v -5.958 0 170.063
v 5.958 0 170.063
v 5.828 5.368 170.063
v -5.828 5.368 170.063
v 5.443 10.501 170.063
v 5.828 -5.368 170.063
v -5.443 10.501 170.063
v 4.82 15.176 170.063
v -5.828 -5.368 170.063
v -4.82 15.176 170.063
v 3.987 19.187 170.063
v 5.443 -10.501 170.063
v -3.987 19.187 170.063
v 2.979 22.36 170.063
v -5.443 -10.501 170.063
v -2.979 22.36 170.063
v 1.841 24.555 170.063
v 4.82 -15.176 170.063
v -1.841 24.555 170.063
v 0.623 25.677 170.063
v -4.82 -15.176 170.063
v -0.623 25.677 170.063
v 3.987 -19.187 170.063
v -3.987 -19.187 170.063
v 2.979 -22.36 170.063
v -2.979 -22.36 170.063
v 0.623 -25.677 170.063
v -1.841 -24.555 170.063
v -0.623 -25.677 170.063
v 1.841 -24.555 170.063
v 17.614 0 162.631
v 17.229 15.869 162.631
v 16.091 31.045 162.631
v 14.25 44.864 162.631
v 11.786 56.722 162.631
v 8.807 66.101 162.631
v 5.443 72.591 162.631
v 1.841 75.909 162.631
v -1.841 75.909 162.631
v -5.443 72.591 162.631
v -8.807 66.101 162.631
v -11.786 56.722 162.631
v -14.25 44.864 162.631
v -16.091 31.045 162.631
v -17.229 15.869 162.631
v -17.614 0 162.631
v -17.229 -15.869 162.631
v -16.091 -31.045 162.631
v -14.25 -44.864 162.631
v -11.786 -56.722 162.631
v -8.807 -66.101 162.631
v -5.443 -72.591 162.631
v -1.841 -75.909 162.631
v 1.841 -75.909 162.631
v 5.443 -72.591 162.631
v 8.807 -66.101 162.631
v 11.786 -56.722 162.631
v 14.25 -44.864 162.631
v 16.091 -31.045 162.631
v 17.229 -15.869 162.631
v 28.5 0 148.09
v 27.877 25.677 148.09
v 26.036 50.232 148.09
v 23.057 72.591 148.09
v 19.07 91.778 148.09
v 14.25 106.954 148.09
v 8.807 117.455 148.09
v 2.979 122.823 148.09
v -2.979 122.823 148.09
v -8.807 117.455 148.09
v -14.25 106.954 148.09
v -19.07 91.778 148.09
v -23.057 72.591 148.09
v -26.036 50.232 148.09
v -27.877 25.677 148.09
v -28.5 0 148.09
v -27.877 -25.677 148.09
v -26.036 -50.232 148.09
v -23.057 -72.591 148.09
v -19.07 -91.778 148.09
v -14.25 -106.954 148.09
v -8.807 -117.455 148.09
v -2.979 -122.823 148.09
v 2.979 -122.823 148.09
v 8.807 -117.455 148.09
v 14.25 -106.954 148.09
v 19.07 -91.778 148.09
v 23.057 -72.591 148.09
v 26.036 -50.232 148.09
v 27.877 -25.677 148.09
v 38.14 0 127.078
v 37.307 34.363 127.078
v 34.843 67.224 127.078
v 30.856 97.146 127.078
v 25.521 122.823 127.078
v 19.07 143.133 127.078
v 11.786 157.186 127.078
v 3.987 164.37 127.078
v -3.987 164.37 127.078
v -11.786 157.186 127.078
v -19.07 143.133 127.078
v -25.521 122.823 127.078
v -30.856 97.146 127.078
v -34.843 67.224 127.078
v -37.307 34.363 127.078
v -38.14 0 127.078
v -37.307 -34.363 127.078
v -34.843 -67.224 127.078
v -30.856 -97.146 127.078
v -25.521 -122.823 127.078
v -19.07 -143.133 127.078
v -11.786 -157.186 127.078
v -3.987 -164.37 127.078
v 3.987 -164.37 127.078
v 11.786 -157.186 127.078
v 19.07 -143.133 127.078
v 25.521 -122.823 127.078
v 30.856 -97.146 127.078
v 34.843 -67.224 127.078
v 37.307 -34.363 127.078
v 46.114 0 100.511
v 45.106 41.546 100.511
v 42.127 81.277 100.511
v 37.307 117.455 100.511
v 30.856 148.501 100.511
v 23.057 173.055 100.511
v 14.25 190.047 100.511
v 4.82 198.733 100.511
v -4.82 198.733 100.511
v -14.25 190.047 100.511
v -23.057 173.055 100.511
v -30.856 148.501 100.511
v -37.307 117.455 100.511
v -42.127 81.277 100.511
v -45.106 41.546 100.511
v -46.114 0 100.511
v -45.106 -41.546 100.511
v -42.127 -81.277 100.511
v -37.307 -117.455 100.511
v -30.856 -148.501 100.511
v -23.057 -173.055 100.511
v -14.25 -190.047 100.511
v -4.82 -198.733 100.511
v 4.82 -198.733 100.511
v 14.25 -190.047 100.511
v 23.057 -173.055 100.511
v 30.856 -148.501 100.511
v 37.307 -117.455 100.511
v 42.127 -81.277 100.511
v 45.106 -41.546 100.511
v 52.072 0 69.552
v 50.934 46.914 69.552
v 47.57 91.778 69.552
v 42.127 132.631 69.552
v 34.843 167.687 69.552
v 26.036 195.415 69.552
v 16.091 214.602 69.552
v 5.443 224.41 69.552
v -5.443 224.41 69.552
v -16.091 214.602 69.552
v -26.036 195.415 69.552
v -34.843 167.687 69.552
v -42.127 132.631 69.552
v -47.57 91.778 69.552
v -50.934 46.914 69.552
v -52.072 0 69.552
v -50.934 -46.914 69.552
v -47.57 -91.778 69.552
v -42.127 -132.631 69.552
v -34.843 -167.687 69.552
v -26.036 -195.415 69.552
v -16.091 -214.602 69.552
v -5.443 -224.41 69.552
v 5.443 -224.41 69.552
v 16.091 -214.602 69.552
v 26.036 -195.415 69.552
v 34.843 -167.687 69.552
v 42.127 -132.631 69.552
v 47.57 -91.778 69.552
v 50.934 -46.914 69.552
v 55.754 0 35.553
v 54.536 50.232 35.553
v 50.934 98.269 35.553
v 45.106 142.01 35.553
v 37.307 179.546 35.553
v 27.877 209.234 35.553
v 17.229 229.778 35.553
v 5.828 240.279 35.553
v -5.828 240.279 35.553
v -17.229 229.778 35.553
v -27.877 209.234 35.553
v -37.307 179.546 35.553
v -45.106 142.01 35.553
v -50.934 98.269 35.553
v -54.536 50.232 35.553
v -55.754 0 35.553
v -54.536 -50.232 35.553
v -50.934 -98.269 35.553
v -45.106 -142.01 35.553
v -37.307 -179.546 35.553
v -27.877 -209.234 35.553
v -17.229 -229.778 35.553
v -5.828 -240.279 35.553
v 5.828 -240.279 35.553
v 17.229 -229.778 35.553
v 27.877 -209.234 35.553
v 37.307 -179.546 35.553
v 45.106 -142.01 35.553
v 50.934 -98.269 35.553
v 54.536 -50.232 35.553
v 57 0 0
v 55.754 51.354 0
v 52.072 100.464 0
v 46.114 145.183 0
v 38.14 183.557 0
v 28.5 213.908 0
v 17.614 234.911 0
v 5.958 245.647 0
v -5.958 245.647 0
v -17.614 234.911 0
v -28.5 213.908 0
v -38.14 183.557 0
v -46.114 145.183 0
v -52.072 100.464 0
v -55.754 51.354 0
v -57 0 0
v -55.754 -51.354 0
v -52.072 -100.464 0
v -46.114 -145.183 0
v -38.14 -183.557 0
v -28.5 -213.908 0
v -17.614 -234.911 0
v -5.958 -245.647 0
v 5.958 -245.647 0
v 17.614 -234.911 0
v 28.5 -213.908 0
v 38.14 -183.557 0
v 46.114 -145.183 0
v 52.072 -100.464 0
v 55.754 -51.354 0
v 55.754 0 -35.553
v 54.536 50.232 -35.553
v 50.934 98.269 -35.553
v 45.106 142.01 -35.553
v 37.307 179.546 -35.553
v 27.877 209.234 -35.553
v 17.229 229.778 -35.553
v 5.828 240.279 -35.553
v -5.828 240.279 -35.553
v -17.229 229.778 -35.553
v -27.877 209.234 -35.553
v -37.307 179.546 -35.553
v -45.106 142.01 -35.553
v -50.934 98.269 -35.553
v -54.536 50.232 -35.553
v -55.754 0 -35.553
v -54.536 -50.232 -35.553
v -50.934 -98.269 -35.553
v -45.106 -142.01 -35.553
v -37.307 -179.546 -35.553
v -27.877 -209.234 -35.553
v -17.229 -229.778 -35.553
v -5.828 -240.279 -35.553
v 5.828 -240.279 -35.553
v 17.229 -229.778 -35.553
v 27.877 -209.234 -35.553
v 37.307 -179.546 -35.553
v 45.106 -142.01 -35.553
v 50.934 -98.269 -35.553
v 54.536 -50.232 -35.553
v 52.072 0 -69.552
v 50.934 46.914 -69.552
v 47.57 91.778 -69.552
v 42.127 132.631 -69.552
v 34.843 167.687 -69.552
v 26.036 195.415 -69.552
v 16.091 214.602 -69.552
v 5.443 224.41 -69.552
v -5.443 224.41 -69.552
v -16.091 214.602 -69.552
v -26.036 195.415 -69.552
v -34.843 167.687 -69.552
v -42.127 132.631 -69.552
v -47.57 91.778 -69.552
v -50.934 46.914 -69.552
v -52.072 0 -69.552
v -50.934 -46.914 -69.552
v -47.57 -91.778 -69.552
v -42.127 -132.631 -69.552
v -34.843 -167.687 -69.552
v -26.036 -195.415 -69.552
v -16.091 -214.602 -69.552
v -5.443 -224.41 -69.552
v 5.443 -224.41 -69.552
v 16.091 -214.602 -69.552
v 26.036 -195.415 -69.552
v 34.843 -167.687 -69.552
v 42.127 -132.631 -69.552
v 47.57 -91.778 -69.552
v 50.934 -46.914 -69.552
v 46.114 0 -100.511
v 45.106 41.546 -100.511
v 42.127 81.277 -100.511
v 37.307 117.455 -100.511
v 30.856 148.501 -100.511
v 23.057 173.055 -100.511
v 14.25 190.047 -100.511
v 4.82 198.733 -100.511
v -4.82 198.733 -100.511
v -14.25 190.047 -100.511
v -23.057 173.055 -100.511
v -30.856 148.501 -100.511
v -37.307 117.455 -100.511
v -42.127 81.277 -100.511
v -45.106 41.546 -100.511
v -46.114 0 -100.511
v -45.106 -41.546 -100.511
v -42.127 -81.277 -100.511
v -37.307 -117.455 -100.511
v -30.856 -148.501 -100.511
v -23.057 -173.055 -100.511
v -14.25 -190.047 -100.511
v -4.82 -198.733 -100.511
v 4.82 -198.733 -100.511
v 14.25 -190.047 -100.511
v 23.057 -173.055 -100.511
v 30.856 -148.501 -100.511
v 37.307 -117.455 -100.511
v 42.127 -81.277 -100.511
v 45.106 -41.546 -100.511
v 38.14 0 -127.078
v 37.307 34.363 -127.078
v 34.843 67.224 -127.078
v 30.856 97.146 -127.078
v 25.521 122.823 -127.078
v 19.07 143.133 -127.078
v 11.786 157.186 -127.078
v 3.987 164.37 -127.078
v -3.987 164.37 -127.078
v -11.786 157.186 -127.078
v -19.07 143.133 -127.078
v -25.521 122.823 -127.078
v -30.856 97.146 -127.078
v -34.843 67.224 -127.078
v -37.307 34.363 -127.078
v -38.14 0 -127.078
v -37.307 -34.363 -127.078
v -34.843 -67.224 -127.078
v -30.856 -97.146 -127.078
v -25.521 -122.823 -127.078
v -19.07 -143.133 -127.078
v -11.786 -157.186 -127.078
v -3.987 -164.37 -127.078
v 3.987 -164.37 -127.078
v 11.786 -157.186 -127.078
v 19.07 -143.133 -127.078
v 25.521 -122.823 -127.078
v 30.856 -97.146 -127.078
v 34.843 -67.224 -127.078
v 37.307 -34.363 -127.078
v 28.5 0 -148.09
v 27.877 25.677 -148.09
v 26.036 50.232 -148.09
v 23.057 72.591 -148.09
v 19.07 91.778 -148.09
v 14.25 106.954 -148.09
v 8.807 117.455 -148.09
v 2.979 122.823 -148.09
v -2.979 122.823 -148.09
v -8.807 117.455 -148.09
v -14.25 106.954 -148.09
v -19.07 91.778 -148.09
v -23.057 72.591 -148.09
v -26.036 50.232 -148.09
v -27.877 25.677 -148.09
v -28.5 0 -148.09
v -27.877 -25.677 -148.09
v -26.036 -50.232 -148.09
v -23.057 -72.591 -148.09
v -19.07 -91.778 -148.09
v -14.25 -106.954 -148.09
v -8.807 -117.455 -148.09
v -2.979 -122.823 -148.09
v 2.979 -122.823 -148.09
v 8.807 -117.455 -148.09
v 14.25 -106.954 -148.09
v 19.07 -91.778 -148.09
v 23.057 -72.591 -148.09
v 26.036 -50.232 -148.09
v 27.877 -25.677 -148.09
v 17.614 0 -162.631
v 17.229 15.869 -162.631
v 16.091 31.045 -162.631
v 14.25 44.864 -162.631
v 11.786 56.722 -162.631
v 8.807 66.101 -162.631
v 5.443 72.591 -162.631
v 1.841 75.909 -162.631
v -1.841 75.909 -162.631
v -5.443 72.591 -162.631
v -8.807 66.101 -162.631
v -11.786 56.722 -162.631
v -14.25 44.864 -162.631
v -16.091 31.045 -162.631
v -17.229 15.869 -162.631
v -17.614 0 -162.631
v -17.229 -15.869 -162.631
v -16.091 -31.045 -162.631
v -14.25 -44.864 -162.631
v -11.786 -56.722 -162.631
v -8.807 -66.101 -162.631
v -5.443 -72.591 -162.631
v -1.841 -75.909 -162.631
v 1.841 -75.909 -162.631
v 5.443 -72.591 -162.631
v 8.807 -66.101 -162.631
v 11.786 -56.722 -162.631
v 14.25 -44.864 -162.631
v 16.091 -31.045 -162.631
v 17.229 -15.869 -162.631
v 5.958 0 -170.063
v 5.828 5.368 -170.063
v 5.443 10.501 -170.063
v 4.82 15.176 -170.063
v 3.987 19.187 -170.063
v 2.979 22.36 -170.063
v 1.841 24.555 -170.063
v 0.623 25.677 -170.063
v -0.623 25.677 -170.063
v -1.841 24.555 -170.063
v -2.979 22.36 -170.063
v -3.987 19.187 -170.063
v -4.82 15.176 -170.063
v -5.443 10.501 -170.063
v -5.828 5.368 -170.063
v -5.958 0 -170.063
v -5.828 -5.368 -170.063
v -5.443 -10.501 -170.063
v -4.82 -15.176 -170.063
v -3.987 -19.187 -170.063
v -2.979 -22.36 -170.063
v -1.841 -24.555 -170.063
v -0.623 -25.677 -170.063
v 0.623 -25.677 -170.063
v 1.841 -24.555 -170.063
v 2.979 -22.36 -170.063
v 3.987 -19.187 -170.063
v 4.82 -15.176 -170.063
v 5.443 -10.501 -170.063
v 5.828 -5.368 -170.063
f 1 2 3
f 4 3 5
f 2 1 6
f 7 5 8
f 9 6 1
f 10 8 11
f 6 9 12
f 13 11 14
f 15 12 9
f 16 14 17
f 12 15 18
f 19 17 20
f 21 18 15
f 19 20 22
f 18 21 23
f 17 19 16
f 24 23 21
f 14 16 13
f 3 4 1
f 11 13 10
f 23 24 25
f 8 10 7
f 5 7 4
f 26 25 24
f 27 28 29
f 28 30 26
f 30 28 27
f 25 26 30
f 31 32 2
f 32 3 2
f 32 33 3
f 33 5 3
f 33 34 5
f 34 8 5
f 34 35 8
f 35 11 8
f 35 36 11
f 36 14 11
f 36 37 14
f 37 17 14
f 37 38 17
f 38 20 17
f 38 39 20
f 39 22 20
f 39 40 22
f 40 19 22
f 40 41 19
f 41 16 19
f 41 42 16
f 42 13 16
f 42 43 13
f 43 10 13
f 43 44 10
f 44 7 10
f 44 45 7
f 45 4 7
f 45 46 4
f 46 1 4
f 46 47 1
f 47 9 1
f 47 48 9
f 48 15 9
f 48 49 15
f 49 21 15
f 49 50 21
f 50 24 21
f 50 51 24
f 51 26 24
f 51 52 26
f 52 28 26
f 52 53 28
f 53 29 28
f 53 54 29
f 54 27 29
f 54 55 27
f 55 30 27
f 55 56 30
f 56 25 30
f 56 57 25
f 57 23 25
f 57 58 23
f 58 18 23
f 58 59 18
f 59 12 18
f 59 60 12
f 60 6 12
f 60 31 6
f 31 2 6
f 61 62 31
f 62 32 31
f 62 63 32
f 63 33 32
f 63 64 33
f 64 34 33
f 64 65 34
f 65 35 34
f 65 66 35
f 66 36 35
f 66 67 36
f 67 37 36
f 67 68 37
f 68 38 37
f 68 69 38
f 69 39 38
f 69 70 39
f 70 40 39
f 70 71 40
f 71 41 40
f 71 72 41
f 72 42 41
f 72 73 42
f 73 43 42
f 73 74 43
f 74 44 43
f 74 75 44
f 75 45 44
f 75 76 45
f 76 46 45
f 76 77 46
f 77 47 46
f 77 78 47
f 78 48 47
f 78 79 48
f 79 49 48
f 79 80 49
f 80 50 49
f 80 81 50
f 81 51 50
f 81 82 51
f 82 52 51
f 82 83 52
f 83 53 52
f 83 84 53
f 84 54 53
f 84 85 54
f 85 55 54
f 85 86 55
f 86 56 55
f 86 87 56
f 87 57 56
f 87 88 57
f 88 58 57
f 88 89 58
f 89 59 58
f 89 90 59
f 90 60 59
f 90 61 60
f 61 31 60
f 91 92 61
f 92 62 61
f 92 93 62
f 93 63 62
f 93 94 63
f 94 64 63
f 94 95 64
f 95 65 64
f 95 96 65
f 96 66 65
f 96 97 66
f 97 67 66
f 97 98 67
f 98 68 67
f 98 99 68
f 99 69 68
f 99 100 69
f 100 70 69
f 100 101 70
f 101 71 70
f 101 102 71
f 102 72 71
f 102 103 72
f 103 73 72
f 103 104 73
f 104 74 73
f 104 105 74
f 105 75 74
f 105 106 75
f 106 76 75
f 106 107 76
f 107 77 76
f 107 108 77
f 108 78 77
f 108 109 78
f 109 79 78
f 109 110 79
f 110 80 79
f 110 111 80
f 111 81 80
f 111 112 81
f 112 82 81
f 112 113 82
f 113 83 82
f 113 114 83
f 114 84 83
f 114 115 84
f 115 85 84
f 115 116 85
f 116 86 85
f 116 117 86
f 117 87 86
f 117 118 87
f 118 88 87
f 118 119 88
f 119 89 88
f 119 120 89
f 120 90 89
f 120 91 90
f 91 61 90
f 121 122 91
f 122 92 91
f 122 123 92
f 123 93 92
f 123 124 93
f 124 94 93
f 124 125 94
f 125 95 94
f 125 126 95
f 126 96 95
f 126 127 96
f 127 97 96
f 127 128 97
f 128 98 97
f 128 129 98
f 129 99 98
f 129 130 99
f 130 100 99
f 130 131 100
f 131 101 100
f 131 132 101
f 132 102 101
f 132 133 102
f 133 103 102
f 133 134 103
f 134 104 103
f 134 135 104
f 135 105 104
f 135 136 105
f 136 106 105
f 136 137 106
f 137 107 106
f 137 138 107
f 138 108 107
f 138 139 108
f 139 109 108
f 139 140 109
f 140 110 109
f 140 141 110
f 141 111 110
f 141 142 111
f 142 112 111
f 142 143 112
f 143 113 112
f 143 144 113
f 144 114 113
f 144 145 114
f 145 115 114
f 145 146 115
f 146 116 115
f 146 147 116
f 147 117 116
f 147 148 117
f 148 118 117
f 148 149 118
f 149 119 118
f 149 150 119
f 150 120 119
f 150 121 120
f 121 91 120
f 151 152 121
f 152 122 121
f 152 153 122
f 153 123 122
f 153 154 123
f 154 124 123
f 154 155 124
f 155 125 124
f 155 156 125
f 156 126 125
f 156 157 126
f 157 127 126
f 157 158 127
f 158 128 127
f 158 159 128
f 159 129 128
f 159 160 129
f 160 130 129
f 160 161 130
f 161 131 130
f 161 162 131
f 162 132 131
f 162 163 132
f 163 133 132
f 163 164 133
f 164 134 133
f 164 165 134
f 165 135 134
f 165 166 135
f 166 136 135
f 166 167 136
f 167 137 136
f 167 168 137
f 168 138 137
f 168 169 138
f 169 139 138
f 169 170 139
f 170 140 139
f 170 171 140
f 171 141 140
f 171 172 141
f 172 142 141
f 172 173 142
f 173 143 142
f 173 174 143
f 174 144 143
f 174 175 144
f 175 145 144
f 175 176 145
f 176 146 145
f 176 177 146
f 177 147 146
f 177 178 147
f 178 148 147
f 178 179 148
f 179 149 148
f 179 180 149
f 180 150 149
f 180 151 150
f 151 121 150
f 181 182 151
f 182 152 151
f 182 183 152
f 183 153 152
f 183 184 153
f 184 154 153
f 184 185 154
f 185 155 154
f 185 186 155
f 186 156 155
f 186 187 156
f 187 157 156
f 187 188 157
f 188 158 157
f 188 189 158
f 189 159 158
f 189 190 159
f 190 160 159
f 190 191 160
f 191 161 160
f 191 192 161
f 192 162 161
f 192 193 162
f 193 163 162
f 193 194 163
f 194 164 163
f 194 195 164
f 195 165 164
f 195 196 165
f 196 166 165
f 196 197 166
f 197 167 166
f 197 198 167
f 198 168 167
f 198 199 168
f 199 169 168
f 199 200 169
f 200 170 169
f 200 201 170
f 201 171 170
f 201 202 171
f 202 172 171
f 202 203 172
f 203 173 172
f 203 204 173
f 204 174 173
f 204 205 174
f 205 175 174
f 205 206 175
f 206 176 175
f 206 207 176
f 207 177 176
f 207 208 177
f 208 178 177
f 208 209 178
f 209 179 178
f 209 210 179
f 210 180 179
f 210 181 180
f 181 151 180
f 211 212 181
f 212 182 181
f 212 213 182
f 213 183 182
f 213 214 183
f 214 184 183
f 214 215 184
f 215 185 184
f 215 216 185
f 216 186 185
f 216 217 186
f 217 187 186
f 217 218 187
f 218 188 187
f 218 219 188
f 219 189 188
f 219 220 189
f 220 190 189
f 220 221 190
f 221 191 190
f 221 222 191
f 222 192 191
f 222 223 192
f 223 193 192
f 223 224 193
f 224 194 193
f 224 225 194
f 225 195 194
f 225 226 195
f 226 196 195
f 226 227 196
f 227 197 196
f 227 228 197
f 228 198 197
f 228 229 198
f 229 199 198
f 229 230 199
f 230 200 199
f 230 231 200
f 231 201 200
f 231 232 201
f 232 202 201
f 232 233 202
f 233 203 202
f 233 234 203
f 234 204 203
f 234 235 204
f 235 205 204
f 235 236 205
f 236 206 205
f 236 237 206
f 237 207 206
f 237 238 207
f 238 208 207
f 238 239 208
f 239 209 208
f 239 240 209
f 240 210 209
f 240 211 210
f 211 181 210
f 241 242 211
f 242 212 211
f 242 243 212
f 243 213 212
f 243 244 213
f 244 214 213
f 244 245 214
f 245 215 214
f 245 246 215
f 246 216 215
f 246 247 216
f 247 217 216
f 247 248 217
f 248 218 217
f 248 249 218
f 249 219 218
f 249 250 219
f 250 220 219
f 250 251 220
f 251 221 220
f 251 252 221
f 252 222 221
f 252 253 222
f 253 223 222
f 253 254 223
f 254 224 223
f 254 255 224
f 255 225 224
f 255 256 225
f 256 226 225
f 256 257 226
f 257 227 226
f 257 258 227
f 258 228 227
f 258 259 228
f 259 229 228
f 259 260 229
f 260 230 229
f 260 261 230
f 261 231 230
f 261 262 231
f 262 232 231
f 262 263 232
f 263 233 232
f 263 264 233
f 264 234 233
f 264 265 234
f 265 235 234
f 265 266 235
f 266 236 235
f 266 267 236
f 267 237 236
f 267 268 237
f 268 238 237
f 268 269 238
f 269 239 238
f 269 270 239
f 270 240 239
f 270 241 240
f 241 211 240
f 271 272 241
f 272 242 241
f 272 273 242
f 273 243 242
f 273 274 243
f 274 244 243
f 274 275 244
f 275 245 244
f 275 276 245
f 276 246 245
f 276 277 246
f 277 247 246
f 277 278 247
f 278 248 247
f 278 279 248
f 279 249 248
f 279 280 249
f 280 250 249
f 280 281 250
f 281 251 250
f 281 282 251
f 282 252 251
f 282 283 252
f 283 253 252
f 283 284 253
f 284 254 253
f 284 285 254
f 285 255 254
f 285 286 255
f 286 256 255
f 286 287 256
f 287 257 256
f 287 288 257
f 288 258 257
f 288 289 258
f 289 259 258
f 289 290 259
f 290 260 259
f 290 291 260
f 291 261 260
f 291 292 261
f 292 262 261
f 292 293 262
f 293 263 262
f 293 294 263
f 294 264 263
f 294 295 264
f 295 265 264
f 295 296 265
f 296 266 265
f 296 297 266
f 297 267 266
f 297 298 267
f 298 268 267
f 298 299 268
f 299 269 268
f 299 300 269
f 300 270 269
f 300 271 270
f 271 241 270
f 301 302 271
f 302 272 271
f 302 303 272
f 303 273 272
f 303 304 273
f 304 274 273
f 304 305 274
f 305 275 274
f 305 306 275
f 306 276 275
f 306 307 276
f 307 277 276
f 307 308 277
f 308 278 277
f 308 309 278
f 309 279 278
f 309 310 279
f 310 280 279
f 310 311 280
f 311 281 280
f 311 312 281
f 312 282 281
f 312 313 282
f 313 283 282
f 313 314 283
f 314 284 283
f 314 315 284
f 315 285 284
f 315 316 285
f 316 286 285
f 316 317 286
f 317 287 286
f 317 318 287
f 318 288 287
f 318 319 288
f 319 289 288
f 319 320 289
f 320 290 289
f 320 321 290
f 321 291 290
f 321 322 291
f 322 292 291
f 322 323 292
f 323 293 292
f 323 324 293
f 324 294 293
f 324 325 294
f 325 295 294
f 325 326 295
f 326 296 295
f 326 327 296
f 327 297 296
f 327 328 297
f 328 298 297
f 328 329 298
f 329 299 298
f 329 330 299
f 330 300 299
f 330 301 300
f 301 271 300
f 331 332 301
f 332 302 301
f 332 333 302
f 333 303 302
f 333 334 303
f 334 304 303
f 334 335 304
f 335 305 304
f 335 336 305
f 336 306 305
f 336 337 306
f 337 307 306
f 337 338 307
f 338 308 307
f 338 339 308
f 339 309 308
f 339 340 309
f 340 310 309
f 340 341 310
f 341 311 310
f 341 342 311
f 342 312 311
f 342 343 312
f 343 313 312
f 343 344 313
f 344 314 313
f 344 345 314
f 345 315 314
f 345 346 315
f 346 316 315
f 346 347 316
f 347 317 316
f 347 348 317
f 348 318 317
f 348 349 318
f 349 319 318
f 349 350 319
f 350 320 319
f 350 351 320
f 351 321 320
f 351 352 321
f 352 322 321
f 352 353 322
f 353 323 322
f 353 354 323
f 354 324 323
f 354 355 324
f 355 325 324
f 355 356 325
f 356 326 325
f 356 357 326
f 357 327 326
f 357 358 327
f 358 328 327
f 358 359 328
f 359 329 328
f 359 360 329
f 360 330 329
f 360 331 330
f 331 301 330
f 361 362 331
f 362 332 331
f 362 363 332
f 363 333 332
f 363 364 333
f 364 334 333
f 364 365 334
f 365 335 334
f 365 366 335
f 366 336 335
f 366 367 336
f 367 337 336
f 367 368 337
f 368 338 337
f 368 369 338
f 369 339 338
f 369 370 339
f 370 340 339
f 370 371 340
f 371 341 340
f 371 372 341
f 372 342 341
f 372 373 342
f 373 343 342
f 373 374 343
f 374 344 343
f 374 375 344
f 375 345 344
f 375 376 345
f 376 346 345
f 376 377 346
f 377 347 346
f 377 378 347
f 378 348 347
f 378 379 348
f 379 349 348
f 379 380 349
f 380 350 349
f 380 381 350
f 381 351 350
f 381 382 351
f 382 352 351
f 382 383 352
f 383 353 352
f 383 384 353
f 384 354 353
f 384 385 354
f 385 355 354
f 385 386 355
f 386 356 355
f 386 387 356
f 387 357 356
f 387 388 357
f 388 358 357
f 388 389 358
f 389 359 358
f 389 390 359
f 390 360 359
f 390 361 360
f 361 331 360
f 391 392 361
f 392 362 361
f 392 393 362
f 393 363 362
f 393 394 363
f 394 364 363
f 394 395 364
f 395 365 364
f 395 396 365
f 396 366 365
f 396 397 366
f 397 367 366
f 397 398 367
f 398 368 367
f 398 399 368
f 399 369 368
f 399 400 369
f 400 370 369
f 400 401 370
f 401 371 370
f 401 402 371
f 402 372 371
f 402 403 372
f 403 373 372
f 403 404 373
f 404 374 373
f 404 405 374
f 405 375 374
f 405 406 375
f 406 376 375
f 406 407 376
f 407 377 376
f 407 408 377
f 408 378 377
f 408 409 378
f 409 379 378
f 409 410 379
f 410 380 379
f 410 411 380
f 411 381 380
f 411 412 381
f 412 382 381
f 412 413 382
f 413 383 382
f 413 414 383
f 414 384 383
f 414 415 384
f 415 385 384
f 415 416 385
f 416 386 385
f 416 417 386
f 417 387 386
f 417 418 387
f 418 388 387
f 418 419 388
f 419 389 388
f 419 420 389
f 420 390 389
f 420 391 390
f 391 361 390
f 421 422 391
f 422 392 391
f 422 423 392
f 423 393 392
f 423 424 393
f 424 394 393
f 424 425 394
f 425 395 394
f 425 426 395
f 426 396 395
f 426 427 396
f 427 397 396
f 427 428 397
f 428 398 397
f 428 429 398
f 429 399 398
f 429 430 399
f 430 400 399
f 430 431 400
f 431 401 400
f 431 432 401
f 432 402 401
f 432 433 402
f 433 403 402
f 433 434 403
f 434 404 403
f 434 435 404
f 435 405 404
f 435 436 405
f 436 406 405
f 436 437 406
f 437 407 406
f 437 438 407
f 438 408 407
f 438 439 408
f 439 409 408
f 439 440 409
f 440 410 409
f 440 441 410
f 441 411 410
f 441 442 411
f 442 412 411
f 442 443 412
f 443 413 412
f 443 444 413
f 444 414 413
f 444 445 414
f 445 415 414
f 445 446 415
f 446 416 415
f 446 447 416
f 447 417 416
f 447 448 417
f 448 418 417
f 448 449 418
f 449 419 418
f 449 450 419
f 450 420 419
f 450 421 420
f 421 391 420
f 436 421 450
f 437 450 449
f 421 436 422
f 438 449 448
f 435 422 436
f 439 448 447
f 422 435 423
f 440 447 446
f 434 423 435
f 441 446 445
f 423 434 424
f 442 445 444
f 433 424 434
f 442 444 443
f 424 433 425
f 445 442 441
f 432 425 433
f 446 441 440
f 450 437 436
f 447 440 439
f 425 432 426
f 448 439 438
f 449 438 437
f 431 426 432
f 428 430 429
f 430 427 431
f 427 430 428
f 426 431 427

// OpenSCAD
// Generated by SolidPython 1.0.1 on 2020-07-29 00:46:45


scale(v = [3, 13, 9]) {
	sphere(r = 19);
}
/***********************************************
*********      SolidPython code:      **********
************************************************
 
# import packages: SolidPython
from solid import *
from solid.utils import *
from itertools import chain, combinations, permutations


class Resize:

    def __init__(self, scad_file):
        self.scad_file = scad_file
        #self.scad_file = import_scad(scad_file)
        # cone/cylinder param:
        self.r1 = 0
        self.r2 = 0
        self.h = 0
        # rectangular prism param:
        self.w = 0
        self.l = 0
        # ellipse param:
        self.r = 0

    # import OpenScad code (file name corresponds to shape)


    # classify shape + parameters
    def assign(self, param1, param2, param3):
        if self.scad_file == 'cone.scad':
            self.r1 = param1
            self.r2 = param2
            self.h = param3
        elif self.scad_file == 'cylinder.scad':
            self.r1 = param1
            self.r2 = param2
            self.h = param3
        elif self.scad_file == 'rectangularPrism.scad':
            self.h = param1
            self.l = param2
            self.w = param3
        else:
            self.r = param1
            self.h = param2

    # resize parameters
    def iterate(self):
        x = range(3, 20, 2)
        i = 1
        if self.scad_file == 'cone.scad':
            tempList = list(permutations(x, 2))
            for temp in tempList:
                param1 = temp[0]
                param2 = temp[1]
                filepath = 'produced_scad_files/' + 'cone' + str(param1) + '_' + str(param2) + '_' + '.scad'
                scad_render_to_file(cylinder(h=param1, r1=param2, r2=0), filepath)

        elif self.scad_file == 'cylinder.scad':
            tempList = list(permutations(x, 3))
            for temp in tempList:
                param1 = temp[0]
                param2 = temp[1]
                filepath = 'produced_scad_files/' + 'cylinder' + str(param1) + '_' + str(param2) + '_' + '.scad'
                scad_render_to_file(cylinder(h=param1, r1=param2, r2=param2), filepath)

        elif self.scad_file == 'rectangularPrism.scad':
            tempList = list(permutations(x, 3))
            for temp in tempList:
                param1 = temp[0]
                param2 = temp[1]
                param3 = temp[2]
                filepath = 'produced_scad_files/' + 'rectangularPrism' + str(param1) + '_' + str(param2) + '_' + str(
                    param3) + '.scad'
                scad_render_to_file(cube(size=(param1, param2, param3)), filepath)

        elif self.scad_file == 'ellipse.scad':
            tempList = list(permutations(x, 4))
            for temp in tempList:
                param1 = temp[0]
                param2 = temp[1]
                param3 = temp[2]
                param4 = temp[3]
                filepath = 'produced_scad_files/' + 'ellipse' + str(param1) + '_' + str(param2) + '_' + str(param3) + '_' + str(param4) + '.scad'
                scad_render_to_file(scale([param1, param2, param3])(sphere(r=param4)), filepath)

    def render_to_scadfile(self):
        scad_render_to_file(scad, 'example.scad') 
 
************************************************/
